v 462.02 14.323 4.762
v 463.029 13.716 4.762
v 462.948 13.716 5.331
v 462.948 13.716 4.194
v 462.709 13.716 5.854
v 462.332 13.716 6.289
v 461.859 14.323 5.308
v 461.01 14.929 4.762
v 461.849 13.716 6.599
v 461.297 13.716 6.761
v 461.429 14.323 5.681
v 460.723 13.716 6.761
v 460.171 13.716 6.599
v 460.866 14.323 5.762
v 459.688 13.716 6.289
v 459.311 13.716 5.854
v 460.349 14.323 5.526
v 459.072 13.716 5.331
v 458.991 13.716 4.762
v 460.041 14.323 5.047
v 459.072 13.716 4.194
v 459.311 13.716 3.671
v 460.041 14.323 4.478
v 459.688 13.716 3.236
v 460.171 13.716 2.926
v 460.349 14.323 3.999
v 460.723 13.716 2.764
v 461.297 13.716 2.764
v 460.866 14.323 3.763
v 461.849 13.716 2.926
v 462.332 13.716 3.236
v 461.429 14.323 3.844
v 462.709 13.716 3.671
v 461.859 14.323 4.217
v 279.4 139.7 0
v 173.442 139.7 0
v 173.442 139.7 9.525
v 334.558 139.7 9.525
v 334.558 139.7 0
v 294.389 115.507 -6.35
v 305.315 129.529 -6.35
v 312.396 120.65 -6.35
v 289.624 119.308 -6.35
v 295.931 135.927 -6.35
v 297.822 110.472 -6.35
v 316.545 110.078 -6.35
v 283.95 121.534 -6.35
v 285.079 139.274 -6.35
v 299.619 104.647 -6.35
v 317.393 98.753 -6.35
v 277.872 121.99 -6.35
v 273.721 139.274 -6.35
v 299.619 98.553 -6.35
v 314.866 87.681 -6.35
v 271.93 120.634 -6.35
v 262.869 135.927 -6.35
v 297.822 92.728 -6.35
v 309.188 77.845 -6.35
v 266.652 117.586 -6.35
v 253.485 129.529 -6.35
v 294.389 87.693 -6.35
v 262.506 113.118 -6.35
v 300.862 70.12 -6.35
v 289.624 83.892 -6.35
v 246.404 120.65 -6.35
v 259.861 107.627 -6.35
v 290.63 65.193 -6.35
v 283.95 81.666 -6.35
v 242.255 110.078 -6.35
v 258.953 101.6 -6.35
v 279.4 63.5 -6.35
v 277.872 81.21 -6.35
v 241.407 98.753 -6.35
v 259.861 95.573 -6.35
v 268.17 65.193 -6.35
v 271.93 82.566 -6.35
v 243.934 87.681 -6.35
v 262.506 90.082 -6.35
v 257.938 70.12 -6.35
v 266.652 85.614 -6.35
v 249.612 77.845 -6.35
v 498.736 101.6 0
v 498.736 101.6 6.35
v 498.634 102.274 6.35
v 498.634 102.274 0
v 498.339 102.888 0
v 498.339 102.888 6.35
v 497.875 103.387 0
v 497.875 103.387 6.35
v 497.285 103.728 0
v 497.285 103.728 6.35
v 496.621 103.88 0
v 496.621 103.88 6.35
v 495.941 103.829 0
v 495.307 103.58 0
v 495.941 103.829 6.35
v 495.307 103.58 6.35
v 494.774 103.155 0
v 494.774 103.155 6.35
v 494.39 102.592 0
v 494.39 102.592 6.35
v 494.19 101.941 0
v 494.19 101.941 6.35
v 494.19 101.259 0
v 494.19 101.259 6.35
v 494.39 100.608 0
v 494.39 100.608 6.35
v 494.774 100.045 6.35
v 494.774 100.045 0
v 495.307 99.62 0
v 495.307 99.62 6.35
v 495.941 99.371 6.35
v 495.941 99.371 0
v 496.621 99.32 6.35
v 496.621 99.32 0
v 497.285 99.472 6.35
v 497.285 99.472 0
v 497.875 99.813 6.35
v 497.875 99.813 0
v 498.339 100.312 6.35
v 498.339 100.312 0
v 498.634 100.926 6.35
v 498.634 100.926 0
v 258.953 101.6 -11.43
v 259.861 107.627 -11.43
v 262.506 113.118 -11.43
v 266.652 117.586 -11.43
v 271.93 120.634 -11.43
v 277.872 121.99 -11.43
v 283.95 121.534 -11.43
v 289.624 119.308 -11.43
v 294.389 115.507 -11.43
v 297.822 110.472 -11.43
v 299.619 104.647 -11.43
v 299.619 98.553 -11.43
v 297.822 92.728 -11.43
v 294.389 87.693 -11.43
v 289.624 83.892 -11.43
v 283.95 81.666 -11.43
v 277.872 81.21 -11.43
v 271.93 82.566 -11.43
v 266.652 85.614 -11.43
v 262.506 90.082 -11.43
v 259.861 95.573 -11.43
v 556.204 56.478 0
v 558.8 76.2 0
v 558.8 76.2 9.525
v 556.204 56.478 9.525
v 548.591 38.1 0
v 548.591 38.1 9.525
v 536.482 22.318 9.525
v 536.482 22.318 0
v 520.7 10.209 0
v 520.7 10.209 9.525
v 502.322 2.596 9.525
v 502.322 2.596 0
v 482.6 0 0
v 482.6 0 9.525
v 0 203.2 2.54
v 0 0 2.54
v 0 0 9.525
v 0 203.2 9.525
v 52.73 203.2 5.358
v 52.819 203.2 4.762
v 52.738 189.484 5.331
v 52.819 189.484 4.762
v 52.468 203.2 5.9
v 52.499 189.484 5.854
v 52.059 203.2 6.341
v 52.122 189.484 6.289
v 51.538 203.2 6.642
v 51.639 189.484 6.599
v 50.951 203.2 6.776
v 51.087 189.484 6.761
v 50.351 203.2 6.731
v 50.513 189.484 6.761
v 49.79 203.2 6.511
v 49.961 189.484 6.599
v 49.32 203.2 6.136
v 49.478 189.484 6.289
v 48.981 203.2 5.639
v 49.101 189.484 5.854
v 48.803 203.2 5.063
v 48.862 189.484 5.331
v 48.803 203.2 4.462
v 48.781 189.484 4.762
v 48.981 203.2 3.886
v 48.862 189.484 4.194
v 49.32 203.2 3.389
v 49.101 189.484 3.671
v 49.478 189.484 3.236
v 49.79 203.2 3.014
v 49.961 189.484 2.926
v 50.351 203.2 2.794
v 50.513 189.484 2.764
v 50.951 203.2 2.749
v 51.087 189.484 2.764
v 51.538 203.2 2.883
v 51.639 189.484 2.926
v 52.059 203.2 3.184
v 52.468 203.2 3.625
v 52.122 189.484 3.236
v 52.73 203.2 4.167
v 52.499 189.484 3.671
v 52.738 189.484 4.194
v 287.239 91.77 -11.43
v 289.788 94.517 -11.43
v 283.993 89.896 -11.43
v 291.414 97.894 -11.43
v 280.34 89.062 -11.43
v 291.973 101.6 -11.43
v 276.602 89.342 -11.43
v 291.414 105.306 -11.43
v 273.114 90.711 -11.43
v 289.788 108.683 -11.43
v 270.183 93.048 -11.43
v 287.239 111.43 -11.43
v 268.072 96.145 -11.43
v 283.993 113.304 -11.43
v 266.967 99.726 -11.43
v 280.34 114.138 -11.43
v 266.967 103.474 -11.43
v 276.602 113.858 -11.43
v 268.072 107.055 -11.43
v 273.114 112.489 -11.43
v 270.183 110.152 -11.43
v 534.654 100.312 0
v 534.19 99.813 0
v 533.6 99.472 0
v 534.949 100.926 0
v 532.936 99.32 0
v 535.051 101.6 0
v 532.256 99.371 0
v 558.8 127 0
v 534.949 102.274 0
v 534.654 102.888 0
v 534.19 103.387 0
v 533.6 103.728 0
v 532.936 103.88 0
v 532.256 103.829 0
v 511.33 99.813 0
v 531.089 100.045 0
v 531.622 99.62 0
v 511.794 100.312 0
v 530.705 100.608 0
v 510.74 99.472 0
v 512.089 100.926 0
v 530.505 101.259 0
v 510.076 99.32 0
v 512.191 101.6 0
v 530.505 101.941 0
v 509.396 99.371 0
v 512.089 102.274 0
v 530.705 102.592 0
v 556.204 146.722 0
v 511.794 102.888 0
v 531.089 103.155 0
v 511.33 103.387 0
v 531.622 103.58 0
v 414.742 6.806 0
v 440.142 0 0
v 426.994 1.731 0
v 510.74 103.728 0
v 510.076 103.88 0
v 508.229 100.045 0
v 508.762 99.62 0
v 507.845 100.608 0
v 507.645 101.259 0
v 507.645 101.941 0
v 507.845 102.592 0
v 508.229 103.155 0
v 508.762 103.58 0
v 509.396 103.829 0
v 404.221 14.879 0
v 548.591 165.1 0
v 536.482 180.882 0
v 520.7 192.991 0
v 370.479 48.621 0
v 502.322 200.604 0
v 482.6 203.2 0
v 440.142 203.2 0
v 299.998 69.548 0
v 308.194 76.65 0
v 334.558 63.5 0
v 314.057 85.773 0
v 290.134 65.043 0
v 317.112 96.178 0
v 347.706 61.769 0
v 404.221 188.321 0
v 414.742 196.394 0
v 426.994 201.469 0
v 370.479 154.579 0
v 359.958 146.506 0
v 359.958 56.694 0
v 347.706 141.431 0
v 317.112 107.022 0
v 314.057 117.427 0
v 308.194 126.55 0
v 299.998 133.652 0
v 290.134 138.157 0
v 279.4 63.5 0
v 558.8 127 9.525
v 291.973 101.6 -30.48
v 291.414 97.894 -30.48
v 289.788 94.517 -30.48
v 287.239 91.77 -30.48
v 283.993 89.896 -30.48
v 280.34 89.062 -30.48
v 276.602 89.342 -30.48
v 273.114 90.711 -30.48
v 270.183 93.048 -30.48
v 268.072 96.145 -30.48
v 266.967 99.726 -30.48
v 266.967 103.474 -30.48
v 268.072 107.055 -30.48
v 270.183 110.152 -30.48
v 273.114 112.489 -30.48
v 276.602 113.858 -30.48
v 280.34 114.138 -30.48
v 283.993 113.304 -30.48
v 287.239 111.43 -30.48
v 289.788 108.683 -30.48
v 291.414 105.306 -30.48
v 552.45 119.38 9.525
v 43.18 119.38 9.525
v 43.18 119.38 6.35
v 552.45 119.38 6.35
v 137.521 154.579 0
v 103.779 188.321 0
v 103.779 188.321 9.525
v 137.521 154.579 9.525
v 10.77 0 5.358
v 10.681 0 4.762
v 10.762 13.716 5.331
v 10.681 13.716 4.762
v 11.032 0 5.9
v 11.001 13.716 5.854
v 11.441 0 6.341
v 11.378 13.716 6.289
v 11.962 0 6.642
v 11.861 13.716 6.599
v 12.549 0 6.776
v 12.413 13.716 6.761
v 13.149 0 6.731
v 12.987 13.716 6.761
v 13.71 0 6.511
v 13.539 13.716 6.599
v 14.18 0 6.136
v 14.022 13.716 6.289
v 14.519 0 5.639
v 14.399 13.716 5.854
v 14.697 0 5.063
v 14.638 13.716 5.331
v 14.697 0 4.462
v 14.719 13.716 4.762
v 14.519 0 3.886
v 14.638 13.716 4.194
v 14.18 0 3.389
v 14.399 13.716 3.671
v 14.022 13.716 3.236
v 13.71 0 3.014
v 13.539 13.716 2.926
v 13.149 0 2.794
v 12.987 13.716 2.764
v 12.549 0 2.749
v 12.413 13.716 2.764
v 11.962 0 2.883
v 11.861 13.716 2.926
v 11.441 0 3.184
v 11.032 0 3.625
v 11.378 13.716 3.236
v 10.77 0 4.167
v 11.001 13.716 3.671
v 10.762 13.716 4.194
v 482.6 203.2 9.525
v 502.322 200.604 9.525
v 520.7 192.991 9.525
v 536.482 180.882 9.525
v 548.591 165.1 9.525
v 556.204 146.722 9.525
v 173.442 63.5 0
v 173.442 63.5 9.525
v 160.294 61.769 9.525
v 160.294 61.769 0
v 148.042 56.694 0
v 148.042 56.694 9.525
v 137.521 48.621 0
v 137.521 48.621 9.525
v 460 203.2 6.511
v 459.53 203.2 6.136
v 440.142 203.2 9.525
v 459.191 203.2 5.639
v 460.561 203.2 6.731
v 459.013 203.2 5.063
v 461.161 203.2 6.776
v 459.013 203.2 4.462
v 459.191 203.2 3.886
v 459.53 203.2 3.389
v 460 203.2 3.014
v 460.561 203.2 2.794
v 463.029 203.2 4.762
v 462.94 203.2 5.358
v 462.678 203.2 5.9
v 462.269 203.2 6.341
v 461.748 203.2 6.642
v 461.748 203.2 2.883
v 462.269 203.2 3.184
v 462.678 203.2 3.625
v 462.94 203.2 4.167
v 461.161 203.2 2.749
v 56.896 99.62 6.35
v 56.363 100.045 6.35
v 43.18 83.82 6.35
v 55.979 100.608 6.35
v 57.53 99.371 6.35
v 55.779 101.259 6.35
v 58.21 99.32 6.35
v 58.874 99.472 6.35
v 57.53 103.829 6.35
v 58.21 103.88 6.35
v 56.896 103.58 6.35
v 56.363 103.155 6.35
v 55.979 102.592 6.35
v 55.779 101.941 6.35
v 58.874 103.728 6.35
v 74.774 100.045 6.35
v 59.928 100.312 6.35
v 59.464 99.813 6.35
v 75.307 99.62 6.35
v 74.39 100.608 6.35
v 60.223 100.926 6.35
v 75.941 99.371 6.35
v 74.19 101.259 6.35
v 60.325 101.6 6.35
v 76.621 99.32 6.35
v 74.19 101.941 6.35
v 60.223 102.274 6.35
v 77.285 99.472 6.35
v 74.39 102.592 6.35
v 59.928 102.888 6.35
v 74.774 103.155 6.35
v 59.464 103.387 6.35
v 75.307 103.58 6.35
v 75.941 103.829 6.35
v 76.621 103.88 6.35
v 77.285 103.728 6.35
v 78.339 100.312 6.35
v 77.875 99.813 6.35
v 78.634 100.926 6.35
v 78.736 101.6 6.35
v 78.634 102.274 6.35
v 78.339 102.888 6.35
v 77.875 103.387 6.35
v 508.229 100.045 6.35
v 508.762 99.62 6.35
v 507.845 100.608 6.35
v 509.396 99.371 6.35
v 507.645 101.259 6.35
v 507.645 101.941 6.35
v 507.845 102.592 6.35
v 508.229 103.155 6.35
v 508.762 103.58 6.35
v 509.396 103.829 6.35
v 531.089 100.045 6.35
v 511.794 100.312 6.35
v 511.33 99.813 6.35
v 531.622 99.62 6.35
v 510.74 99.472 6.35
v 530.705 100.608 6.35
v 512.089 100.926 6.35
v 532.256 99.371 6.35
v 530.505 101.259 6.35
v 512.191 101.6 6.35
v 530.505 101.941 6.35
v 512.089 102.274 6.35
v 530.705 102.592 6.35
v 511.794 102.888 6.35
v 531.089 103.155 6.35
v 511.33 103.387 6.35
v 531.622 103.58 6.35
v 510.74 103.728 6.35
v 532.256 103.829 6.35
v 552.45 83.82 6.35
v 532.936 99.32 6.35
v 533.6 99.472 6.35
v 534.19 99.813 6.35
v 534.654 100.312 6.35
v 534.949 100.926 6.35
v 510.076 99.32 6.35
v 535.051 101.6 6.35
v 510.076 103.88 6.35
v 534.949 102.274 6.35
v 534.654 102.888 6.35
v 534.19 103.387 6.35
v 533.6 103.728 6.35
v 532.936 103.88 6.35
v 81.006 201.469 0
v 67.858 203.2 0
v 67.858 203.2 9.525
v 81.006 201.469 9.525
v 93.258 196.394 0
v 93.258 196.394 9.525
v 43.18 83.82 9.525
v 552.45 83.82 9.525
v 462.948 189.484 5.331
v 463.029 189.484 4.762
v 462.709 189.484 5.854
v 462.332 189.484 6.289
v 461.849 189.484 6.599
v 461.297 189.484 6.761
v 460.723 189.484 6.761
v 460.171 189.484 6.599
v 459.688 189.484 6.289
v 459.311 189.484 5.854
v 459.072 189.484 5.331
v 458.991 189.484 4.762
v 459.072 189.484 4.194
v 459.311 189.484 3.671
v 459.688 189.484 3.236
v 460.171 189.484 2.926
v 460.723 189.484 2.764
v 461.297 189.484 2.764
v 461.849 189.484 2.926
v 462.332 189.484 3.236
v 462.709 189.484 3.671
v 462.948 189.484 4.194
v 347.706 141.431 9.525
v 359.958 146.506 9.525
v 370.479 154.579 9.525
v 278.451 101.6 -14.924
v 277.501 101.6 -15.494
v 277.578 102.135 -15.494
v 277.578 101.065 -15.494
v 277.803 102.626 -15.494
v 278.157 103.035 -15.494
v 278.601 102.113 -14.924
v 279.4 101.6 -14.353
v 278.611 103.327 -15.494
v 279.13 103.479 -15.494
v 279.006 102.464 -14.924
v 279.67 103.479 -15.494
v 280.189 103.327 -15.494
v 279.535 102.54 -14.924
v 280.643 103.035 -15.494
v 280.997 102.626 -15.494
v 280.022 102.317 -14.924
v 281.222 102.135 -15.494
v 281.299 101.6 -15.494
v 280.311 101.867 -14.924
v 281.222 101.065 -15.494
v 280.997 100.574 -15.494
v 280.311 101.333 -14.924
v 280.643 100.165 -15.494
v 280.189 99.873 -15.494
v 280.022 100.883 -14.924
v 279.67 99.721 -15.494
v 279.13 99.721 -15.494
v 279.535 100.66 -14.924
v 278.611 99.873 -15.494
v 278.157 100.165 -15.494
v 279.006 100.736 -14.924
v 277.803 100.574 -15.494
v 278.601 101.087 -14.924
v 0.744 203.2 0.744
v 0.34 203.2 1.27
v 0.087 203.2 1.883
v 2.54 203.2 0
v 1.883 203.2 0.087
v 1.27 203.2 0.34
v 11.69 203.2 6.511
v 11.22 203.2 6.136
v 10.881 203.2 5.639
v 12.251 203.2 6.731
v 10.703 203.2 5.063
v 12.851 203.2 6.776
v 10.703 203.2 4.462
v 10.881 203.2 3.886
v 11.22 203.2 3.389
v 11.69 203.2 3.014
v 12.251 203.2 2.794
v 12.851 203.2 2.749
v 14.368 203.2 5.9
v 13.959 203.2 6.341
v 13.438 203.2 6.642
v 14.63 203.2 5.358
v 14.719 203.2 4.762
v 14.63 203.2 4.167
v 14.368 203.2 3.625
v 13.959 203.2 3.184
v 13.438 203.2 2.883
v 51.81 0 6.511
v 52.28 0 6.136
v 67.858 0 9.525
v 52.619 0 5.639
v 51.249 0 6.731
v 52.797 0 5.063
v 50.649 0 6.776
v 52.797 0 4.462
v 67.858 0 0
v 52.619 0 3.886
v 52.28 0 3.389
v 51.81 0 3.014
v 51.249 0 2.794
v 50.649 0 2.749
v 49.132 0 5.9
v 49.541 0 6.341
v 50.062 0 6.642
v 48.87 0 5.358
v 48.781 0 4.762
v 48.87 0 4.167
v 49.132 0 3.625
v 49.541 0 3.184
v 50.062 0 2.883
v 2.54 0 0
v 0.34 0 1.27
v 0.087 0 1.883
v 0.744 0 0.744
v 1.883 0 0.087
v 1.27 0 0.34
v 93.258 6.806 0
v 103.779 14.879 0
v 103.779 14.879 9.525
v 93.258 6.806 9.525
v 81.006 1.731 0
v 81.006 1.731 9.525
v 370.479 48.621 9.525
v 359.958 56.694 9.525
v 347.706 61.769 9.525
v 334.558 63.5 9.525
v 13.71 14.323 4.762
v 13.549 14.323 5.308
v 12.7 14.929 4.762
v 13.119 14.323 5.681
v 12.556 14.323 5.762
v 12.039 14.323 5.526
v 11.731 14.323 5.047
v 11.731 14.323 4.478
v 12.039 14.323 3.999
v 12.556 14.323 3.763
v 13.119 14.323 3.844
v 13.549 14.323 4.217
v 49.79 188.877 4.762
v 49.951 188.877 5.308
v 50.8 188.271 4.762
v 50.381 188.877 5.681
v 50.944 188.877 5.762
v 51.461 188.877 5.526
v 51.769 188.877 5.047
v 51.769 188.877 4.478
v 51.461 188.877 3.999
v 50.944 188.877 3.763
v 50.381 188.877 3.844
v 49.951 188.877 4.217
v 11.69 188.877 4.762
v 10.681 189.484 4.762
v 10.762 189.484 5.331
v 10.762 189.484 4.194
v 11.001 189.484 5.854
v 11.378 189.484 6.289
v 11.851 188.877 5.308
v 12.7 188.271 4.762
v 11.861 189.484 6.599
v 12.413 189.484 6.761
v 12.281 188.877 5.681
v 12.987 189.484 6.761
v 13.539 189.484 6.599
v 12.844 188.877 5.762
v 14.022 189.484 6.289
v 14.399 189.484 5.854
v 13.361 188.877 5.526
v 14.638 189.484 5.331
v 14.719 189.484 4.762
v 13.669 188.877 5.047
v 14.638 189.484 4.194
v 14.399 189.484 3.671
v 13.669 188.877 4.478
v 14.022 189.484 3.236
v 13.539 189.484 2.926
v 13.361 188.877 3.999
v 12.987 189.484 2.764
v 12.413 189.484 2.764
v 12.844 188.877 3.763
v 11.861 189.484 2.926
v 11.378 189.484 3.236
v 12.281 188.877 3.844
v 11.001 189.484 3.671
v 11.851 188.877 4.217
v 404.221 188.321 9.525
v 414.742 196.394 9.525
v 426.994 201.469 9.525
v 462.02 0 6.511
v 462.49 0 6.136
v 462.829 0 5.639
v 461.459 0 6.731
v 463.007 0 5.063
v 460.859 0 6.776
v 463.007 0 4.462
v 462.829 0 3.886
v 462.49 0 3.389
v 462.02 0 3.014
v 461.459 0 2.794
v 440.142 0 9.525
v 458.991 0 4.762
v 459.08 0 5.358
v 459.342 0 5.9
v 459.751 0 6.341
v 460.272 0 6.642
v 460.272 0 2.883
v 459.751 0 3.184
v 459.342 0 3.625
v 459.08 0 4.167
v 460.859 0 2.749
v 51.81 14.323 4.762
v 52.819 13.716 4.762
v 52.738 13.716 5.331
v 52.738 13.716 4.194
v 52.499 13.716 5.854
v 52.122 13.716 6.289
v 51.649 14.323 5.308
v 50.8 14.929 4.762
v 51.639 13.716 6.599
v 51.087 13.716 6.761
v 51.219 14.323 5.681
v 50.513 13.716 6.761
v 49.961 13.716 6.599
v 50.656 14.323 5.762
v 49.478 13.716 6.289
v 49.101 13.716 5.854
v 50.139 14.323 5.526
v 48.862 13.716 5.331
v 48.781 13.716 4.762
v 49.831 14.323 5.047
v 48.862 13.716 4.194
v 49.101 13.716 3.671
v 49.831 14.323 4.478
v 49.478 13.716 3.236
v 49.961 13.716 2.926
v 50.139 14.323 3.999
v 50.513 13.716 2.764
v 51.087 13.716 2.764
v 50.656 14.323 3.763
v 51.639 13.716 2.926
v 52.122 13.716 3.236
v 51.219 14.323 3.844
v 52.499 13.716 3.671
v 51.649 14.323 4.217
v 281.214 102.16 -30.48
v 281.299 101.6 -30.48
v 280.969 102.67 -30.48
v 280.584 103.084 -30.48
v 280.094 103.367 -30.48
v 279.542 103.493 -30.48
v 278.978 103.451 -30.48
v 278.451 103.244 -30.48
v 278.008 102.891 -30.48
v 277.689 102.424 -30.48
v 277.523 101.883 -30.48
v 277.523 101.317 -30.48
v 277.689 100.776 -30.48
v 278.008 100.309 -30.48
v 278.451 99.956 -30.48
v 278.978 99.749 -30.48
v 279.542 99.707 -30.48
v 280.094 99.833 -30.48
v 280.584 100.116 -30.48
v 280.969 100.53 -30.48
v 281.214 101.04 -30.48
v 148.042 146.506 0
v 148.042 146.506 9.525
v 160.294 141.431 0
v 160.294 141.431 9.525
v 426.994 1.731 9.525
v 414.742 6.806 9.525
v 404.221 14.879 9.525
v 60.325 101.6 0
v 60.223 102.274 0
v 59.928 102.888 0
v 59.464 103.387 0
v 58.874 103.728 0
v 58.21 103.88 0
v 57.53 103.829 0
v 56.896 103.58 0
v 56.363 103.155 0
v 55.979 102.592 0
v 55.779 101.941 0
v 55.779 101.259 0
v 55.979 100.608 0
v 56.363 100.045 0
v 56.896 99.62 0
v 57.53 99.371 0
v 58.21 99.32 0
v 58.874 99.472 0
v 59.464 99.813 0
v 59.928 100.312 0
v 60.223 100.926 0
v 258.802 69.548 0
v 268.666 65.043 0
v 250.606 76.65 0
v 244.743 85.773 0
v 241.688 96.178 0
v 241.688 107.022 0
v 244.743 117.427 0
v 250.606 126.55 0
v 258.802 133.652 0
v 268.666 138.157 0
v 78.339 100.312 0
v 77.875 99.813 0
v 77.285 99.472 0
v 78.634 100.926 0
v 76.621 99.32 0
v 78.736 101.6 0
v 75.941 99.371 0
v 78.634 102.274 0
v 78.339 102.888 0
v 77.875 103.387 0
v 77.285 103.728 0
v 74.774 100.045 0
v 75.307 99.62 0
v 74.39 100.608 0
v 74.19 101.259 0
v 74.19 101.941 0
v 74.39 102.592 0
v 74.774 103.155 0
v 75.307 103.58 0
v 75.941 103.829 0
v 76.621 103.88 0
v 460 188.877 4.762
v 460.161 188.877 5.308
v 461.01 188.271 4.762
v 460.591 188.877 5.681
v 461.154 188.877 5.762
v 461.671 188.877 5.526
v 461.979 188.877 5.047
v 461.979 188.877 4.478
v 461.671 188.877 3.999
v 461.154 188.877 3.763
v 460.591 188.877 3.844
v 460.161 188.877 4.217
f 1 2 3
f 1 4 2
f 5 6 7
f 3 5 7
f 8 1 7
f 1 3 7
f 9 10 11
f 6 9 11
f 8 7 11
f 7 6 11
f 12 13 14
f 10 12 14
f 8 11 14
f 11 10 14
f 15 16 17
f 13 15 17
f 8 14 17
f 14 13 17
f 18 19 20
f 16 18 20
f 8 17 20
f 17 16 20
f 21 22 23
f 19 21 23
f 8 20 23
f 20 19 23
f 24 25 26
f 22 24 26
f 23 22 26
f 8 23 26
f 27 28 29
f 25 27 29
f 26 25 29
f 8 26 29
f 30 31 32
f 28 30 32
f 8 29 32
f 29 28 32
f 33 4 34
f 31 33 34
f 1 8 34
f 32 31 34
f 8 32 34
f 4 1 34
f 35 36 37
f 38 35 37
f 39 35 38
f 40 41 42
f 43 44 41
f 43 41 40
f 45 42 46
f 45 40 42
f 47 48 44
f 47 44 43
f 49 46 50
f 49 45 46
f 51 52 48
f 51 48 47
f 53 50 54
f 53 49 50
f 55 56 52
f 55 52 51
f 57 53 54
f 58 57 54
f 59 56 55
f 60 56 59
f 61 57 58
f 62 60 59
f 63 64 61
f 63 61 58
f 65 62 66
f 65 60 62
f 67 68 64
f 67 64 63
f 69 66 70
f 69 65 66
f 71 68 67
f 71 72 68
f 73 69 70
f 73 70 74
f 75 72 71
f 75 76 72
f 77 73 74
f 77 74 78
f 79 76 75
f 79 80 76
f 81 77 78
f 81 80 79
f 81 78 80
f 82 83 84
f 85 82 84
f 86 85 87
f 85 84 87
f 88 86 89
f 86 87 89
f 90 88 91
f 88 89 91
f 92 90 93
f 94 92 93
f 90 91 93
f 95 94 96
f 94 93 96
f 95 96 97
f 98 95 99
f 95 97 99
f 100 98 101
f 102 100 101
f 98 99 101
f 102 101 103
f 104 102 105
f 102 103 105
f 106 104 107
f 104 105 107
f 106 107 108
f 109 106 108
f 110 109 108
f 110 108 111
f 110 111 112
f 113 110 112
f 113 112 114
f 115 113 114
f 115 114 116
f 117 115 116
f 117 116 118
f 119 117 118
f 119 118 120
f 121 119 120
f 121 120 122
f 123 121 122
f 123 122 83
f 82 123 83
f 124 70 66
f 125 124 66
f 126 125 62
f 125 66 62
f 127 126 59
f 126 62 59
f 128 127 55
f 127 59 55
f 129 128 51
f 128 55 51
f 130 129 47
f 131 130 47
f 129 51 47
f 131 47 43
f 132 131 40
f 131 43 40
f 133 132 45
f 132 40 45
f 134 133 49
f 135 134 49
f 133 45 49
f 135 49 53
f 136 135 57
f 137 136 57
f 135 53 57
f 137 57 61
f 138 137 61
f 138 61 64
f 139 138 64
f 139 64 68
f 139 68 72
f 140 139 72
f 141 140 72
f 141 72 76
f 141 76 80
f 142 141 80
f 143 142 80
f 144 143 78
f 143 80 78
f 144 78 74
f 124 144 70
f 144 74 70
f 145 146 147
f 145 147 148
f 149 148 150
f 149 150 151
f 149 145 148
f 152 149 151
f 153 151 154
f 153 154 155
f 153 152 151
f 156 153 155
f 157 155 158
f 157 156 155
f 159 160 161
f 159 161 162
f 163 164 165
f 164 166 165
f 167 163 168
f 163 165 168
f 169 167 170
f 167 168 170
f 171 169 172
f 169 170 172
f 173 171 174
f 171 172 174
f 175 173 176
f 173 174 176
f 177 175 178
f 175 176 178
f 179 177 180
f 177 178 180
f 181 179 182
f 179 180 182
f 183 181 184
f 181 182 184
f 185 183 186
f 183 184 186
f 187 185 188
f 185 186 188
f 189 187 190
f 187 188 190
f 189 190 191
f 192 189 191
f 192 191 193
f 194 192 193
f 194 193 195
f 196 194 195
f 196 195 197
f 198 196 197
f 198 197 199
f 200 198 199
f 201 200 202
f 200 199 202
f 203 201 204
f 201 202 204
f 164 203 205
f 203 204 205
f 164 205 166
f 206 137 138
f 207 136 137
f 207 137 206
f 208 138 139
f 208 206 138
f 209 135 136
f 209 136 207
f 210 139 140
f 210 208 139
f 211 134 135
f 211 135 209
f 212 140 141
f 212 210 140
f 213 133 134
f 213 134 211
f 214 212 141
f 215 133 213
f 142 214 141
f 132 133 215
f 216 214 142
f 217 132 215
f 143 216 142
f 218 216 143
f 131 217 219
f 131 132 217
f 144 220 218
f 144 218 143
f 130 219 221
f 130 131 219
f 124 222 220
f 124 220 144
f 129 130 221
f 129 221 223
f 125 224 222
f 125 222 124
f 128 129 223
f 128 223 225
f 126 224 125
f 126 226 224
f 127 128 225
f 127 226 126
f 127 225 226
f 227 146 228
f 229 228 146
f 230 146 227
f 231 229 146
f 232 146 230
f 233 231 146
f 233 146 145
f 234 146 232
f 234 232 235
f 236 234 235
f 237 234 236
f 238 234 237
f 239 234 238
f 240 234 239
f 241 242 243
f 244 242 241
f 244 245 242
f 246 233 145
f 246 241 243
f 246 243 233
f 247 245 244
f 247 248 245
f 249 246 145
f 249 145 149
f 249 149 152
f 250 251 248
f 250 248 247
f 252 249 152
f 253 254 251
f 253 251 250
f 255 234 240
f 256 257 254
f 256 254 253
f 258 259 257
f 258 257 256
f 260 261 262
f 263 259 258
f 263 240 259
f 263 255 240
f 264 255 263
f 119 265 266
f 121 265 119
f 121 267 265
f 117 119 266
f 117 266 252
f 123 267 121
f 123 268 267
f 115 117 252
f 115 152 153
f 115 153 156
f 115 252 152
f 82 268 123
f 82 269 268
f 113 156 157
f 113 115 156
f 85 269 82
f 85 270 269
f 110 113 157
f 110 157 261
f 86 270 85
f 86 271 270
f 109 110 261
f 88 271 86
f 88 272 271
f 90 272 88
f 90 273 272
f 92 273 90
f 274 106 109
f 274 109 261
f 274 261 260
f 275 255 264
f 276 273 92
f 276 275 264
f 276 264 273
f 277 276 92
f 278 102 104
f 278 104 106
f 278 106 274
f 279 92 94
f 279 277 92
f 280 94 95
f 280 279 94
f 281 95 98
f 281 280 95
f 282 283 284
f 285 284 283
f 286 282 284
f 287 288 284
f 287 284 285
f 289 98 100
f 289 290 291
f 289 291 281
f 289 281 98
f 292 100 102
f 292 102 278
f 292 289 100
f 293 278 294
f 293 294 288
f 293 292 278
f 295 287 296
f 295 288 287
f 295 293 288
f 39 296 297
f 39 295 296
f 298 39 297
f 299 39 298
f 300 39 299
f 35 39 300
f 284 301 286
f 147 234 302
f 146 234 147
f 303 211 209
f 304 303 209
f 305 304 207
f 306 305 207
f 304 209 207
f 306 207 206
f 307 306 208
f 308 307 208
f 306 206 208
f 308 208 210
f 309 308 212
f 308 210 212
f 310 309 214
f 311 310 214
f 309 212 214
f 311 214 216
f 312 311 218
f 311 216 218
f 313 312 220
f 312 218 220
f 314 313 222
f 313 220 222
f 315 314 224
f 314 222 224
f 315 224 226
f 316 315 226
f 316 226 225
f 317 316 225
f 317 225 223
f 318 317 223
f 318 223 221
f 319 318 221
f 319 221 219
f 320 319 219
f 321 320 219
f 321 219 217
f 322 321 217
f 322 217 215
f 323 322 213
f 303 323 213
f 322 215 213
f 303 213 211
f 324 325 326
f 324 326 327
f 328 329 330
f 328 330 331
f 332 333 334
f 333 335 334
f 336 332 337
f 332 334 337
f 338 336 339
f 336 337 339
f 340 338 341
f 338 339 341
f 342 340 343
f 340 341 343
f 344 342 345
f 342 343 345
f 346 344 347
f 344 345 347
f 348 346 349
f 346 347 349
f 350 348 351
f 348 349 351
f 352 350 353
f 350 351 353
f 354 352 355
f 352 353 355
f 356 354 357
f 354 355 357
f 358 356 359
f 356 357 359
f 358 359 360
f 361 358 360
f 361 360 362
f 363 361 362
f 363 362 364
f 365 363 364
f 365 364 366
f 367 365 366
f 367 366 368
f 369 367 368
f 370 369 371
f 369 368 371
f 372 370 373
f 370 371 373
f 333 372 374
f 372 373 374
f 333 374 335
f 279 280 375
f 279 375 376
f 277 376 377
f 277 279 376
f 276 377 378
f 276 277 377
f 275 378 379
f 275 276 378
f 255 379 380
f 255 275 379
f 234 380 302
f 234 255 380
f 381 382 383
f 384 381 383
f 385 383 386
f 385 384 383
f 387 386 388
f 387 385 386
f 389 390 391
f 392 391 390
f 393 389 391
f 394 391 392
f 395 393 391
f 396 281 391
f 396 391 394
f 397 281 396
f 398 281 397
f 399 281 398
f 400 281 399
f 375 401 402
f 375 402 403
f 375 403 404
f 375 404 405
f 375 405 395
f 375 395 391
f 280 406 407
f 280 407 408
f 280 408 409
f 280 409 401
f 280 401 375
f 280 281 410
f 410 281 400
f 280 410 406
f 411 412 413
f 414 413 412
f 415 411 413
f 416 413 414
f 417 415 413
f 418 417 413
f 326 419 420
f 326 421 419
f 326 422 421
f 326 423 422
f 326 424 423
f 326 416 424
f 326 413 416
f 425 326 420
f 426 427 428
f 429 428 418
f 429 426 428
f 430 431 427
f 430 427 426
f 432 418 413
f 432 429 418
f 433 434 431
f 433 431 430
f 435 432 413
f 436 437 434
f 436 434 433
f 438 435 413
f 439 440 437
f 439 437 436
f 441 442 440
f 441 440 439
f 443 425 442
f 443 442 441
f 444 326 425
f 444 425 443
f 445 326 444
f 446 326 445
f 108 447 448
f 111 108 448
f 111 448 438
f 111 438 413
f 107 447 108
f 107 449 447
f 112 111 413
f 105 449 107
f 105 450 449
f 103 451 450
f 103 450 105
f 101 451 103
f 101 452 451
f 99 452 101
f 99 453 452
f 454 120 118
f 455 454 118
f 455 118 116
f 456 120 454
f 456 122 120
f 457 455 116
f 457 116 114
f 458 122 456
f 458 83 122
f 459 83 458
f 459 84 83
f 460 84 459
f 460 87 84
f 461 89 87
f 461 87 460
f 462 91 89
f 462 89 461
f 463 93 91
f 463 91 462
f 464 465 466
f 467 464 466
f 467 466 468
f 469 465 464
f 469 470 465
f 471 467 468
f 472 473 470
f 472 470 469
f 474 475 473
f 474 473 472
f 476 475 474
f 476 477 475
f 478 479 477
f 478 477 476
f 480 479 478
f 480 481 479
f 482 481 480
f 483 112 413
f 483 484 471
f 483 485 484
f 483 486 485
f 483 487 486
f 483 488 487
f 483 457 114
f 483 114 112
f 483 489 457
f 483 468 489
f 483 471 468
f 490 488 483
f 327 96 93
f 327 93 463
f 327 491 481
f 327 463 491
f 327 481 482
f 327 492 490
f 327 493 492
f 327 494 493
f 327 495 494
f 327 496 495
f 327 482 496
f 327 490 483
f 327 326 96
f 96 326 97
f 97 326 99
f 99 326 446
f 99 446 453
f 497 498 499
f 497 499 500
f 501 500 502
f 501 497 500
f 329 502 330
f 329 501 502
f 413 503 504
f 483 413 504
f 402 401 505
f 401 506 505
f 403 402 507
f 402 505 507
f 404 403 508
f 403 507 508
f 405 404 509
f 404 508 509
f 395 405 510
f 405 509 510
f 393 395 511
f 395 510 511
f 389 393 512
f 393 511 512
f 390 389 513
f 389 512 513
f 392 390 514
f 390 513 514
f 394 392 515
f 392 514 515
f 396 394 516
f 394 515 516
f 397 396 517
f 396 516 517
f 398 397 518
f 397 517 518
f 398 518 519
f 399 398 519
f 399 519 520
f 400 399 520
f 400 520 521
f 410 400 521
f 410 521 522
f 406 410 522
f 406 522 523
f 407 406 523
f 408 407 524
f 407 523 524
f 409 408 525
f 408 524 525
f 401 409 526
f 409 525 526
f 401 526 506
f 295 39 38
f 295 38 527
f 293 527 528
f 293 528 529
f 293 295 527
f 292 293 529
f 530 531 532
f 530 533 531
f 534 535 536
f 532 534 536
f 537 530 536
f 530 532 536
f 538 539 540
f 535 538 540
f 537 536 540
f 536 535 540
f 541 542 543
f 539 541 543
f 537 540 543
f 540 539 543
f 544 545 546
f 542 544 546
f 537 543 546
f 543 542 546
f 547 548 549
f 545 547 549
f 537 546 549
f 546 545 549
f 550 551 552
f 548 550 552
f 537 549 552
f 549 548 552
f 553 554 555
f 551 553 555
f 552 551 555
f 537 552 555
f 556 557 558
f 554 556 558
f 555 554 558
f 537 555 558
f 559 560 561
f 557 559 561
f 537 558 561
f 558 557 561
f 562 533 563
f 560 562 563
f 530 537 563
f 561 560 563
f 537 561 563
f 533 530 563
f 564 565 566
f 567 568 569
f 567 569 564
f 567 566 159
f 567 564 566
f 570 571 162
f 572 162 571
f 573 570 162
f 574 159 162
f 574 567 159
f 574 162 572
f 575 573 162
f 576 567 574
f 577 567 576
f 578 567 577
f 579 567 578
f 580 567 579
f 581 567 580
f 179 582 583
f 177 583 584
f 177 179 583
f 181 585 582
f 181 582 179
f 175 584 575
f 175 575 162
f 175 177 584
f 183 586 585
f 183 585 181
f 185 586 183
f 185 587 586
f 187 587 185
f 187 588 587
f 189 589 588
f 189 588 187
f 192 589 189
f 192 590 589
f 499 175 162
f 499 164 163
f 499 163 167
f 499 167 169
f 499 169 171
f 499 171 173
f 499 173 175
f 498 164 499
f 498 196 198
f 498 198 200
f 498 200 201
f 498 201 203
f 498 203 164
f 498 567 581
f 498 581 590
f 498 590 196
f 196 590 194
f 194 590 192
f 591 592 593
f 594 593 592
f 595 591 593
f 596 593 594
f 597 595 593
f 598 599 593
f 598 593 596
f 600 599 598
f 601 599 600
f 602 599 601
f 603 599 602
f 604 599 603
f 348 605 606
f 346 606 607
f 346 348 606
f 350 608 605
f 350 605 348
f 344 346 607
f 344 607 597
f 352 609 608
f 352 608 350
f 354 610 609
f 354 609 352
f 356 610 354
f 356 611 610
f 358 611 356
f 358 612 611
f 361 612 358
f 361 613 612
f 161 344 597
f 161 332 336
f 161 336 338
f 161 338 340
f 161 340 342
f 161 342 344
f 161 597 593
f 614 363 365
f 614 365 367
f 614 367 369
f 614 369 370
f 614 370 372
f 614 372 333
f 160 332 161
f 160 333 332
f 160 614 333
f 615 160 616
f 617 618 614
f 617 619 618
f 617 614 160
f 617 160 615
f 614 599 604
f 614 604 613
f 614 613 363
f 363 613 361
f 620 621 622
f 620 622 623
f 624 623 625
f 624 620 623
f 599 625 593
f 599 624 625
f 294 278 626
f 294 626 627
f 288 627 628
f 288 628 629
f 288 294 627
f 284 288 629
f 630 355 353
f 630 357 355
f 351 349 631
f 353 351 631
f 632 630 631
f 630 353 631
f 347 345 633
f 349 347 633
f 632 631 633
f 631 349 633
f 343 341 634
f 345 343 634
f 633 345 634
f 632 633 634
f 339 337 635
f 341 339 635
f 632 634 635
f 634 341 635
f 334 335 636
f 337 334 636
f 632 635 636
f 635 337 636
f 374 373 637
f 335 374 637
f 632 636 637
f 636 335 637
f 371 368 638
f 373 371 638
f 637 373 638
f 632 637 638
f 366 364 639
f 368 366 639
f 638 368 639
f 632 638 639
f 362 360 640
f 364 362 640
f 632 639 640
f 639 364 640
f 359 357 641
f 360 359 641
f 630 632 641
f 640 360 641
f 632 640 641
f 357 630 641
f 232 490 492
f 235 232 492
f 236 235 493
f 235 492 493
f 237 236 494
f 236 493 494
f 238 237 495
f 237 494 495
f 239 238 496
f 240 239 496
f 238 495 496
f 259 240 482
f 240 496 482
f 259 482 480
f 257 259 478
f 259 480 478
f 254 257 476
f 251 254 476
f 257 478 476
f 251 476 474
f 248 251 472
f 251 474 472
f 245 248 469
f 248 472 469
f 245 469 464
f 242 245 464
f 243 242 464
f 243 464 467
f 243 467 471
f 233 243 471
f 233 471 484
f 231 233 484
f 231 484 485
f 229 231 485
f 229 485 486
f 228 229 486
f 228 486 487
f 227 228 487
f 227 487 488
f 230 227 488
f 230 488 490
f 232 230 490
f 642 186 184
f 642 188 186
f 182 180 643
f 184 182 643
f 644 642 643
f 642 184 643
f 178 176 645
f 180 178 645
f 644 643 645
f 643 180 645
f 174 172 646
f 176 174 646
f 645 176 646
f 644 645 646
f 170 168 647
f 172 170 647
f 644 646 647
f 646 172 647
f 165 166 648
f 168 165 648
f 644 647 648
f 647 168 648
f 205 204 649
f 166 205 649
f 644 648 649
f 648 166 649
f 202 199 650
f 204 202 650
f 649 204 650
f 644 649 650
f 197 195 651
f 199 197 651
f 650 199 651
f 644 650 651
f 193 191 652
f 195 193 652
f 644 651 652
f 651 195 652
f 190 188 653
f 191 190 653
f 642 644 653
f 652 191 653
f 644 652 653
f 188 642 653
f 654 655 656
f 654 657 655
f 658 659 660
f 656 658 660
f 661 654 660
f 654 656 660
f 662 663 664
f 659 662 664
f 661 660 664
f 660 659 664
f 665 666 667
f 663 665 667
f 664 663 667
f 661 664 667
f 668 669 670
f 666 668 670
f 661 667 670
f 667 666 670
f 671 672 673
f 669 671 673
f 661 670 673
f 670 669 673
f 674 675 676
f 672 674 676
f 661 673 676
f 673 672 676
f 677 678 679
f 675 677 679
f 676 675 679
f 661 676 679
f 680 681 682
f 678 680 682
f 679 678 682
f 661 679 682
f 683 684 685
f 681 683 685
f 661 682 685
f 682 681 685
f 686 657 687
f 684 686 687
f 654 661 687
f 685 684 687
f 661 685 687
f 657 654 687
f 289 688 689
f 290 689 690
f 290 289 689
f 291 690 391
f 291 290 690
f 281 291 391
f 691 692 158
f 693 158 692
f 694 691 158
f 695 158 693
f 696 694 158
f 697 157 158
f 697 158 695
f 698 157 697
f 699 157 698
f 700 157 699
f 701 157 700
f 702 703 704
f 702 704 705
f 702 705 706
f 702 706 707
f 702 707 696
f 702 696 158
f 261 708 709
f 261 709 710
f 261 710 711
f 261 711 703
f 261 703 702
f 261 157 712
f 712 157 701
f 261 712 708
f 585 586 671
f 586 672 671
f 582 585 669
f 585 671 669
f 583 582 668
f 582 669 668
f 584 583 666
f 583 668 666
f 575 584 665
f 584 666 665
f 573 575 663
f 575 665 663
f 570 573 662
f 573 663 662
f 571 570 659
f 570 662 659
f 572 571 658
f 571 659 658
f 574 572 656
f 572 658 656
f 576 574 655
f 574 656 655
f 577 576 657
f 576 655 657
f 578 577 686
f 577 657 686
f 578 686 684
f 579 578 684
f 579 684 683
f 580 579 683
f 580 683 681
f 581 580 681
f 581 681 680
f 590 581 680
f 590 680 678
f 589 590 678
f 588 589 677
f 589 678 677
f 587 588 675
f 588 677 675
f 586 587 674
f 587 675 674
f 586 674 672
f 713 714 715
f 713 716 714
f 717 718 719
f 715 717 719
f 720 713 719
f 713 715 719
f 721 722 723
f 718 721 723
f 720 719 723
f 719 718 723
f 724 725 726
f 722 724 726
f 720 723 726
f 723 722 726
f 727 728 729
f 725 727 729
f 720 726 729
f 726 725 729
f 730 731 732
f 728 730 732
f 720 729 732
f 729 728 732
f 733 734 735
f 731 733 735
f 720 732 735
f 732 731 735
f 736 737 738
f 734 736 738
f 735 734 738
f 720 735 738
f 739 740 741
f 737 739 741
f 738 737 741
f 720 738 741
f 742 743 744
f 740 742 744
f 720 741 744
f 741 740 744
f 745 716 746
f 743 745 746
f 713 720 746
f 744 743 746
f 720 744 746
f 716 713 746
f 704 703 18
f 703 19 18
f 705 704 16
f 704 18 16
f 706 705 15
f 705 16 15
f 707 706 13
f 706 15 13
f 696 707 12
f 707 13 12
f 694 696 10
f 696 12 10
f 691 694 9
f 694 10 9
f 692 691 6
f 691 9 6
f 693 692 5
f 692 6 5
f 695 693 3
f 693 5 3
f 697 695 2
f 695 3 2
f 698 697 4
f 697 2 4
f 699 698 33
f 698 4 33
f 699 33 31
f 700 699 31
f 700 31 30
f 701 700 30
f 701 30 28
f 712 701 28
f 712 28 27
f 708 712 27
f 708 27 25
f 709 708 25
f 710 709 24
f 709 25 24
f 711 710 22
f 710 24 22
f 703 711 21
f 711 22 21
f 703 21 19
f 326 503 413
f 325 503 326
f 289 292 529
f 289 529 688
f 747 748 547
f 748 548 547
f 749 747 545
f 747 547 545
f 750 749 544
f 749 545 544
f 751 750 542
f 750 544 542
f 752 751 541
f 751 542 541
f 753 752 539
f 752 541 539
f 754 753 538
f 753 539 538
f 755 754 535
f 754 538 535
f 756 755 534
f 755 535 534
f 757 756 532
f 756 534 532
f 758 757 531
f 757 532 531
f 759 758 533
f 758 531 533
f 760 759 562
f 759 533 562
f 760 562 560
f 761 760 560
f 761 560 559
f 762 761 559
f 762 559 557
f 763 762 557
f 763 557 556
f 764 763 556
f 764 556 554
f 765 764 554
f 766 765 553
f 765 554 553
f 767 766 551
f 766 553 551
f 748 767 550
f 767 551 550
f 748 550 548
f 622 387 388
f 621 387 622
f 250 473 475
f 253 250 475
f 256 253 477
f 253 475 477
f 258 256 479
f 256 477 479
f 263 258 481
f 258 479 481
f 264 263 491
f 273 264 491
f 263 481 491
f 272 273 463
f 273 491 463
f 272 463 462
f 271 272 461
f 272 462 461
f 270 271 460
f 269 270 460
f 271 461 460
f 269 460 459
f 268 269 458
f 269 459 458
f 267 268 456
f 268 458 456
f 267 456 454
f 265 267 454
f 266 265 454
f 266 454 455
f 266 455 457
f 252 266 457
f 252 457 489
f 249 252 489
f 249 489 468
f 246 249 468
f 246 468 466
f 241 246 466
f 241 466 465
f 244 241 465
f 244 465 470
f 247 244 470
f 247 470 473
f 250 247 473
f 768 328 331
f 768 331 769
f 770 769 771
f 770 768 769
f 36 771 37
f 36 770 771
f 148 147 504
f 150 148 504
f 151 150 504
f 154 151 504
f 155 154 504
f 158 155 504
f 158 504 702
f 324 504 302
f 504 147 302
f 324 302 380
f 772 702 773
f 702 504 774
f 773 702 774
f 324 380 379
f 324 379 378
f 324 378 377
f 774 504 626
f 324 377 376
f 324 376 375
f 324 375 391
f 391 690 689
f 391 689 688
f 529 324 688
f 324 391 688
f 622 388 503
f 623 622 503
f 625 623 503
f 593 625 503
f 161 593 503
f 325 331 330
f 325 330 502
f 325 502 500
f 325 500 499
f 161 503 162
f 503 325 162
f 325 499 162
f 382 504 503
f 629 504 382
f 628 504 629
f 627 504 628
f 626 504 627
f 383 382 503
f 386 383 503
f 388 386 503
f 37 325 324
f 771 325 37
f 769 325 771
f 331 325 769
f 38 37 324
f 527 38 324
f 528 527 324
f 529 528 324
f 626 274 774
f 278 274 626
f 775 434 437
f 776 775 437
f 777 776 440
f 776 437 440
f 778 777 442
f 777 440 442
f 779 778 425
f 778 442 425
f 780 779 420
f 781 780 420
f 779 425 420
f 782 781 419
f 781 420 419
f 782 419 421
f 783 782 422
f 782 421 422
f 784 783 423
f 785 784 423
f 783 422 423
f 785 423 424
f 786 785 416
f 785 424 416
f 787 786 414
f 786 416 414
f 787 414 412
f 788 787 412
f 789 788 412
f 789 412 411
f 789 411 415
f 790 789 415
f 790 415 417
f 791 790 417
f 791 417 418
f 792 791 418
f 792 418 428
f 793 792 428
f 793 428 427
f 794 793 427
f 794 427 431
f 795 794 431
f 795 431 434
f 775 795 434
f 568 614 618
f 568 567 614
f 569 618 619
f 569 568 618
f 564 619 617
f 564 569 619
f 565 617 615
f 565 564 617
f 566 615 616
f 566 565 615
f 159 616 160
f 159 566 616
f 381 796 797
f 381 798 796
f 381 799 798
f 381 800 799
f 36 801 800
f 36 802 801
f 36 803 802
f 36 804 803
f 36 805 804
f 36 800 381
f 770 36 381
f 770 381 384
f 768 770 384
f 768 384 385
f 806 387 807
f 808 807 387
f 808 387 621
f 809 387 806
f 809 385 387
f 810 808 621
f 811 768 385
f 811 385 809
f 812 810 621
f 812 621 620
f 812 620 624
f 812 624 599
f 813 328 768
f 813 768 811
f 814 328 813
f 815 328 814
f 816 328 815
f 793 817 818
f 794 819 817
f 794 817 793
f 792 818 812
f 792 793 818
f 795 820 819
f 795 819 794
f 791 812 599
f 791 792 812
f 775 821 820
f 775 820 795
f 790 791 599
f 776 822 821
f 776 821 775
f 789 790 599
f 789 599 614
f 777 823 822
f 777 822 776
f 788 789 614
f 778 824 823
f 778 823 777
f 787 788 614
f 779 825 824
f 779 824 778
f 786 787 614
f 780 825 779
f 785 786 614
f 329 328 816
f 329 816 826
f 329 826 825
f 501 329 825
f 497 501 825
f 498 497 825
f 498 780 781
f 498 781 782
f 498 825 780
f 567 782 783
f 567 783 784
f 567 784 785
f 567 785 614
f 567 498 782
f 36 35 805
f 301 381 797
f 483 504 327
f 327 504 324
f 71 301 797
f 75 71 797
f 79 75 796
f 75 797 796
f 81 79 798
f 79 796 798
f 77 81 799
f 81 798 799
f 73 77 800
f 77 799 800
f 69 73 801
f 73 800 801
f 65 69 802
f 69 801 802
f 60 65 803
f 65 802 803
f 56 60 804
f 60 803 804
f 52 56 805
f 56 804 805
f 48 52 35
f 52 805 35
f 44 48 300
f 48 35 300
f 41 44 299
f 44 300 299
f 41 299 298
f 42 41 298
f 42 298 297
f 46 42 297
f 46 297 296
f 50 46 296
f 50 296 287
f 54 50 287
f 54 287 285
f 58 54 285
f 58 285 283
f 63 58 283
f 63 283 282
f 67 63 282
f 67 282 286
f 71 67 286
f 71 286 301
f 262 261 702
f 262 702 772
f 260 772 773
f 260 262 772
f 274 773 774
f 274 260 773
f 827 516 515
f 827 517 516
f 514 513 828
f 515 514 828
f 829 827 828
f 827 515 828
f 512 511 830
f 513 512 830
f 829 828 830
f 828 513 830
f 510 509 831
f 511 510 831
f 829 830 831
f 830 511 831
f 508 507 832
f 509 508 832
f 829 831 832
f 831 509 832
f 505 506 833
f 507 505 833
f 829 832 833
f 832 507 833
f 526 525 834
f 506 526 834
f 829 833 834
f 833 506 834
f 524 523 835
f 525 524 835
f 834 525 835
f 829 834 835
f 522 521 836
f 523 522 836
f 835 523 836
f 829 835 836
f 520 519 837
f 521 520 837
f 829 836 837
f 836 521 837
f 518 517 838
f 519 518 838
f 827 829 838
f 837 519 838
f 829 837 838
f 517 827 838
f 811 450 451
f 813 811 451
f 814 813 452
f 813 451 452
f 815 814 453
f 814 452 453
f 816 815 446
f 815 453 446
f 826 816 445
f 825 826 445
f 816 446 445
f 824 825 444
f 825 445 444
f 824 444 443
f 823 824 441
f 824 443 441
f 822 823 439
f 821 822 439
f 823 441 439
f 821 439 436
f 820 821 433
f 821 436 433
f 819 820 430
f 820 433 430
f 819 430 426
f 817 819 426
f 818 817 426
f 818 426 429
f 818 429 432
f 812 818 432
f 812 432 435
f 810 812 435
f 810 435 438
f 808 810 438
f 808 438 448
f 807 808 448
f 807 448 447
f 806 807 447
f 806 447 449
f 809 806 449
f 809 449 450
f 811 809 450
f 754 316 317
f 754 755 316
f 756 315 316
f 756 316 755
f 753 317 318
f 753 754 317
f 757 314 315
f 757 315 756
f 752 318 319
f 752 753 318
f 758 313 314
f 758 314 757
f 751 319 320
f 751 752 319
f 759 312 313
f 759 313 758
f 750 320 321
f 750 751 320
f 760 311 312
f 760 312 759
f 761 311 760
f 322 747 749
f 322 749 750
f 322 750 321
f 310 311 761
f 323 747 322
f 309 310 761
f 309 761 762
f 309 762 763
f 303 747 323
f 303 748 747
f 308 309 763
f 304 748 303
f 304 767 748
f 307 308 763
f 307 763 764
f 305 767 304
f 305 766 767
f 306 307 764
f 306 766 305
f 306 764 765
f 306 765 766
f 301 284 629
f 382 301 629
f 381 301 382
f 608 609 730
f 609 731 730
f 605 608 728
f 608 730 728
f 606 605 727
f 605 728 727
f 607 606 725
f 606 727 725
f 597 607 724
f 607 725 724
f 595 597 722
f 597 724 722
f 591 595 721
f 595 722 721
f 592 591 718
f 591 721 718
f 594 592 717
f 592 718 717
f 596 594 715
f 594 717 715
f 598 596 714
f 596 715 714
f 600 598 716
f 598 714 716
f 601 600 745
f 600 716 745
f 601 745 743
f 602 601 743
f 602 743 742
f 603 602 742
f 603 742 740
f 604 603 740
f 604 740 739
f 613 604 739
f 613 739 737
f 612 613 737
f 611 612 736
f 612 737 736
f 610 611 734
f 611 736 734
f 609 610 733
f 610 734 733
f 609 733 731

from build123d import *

# Parameters (mm, degrees)
BOSS_EXTRUDE1_DEPTH        = 9.525
SKETCH2_W                  = 509.27
SKETCH2_H                  = 35.56
CUT_EXTRUDE1_DEPTH         = 3.175
SKETCH3_R                  = 2.286
CUT_EXTRUDE2_DEPTH         = 595.632661817
F_10_32_TAPPED_HOLE1_D     = 4.0386
F_10_32_TAPPED_HOLE1_DEPTH = 13.716
F_10_32_TAPPED_HOLE1_TIP   = 1.213317848
F_10_32_TAPPED_HOLE2_D     = 4.0386
F_10_32_TAPPED_HOLE2_DEPTH = 13.716
F_10_32_TAPPED_HOLE2_TIP   = 1.213317848
SKETCH8_R                  = 38.1
BOSS_EXTRUDE2_DEPTH        = 6.35
SKETCH9_R                  = 20.447
BOSS_EXTRUDE3_DEPTH        = 5.08
SKETCH10_R                 = 12.573
BOSS_EXTRUDE4_DEPTH        = 19.05
F_10_24_TAPPED_HOLE1_D     = 3.7973
F_10_24_TAPPED_HOLE1_DEPTH = 14.986
F_10_24_TAPPED_HOLE1_TIP   = 1.140824014
FILLET2_R                  = 2.54


with BuildPart() as part:
    # Sketch1 → Boss-Extrude1 (new body)
    with BuildSketch(Plane.XY):
        with BuildLine():
            Line((103.778975516, 188.321024484), (137.521024484, 154.578975516))
            ThreePointArc((137.521024484, 154.578975516), (154.001730604, 143.566919748), (173.442048969, 139.7))
            Line((173.442048969, 139.7), (334.557951031, 139.7))
            ThreePointArc((334.557951031, 139.7), (353.998269396, 143.566919748), (370.478975516, 154.578975516))
            Line((370.478975516, 154.578975516), (404.221024484, 188.321024484))
            ThreePointArc((404.221024484, 188.321024484), (420.701730604, 199.333080252), (440.142048969, 203.2))
            Line((440.142048969, 203.2), (482.6, 203.2))
            ThreePointArc((482.6, 203.2), (536.481536726, 180.881536726), (558.8, 127))
            Line((558.8, 127), (558.8, 76.2))
            ThreePointArc((558.8, 76.2), (536.481536726, 22.318463274), (482.6, 0))
            Line((482.6, 0), (440.142048969, 0))
            ThreePointArc((440.142048969, 0), (420.701730604, 3.866919748), (404.221024484, 14.878975516))
            Line((404.221024484, 14.878975516), (370.478975516, 48.621024484))
            ThreePointArc((370.478975516, 48.621024484), (353.998269396, 59.633080252), (334.557951031, 63.5))
            Line((334.557951031, 63.5), (173.442048969, 63.5))
            ThreePointArc((173.442048969, 63.5), (154.001730604, 59.633080252), (137.521024484, 48.621024484))
            Line((137.521024484, 48.621024484), (103.778975516, 14.878975516))
            ThreePointArc((103.778975516, 14.878975516), (87.298269396, 3.866919748), (67.857951031, 0))
            Line((67.857951031, 0), (0, 0))
            Line((0, 0), (0, 203.2))
            Line((0, 203.2), (67.857951031, 203.2))
            ThreePointArc((67.857951031, 203.2), (87.298269396, 199.333080252), (103.778975516, 188.321024484))
        make_face()
    extrude(amount=BOSS_EXTRUDE1_DEPTH)

    # Sketch2 → Cut-Extrude1 (cut)
    with BuildSketch(Plane.XY.offset(9.525)):
        with Locations((297.815, 101.6)):
            Rectangle(SKETCH2_W, SKETCH2_H)
    extrude(amount=-CUT_EXTRUDE1_DEPTH, mode=Mode.SUBTRACT)

    # Sketch3 → Cut-Extrude2 (cut, through all)
    with BuildSketch(Plane.XY.offset(6.35)):
        with Locations((532.765, 101.6)):
            Circle(SKETCH3_R)
        with Locations((58.039, 101.6)):
            Circle(SKETCH3_R)
        with Locations((509.905, 101.6)):
            Circle(SKETCH3_R)
        with Locations((496.45, 101.6)):
            Circle(SKETCH3_R)
        with Locations((76.44999999, 101.6)):
            Circle(SKETCH3_R)
    extrude(amount=-CUT_EXTRUDE2_DEPTH, mode=Mode.SUBTRACT)

    # #10-32 Tapped Hole1
    with Locations(Plane(origin=(0, 203.2, 0), x_dir=(-1, 0, 0), z_dir=(0, 1, 0))):
        with Locations((-12.7, 4.7625), (-50.8, 4.7625), (-461.01, 4.7625)):
            Hole(F_10_32_TAPPED_HOLE1_D / 2, depth=F_10_32_TAPPED_HOLE1_DEPTH)
            with Locations((0, 0, -(F_10_32_TAPPED_HOLE1_DEPTH + F_10_32_TAPPED_HOLE1_TIP / 2))):  # 118° drill point
                Cone(0, F_10_32_TAPPED_HOLE1_D / 2, F_10_32_TAPPED_HOLE1_TIP, mode=Mode.SUBTRACT)

    # #10-32 Tapped Hole2
    with Locations(Plane.XZ):
        with Locations((12.7, 4.7625), (50.8, 4.7625), (461.01, 4.7625)):
            Hole(F_10_32_TAPPED_HOLE2_D / 2, depth=F_10_32_TAPPED_HOLE2_DEPTH)
            with Locations((0, 0, -(F_10_32_TAPPED_HOLE2_DEPTH + F_10_32_TAPPED_HOLE2_TIP / 2))):  # 118° drill point
                Cone(0, F_10_32_TAPPED_HOLE2_D / 2, F_10_32_TAPPED_HOLE2_TIP, mode=Mode.SUBTRACT)

    # Sketch8 → Boss-Extrude2 (add)
    with BuildSketch(Plane(origin=(0, 0, 0), x_dir=(-1, 0, 0), z_dir=(0, 0, -1))):
        with Locations(Location((-279.4, 101.6, 0), (0, 0, 270))):
            Circle(SKETCH8_R)
    extrude(amount=BOSS_EXTRUDE2_DEPTH)

    # Sketch9 → Boss-Extrude3 (add)
    with BuildSketch(Plane(origin=(0, 0, -6.35), x_dir=(-1, 0, 0), z_dir=(0, 0, -1))):
        with Locations((-279.4, 101.6)):
            Circle(SKETCH9_R)
    extrude(amount=BOSS_EXTRUDE3_DEPTH)

    # Sketch10 → Boss-Extrude4 (add)
    with BuildSketch(Plane(origin=(0, 0, -11.43), x_dir=(-1, 0, 0), z_dir=(0, 0, -1))):
        with Locations(Location((-279.4, 101.6, 0), (0, 0, 180))):
            Circle(SKETCH10_R)
    extrude(amount=BOSS_EXTRUDE4_DEPTH)

    # #10-24 Tapped Hole1
    with Locations(Plane(origin=(0, 0, -30.48), x_dir=(-1, 0, 0), z_dir=(0, 0, -1))):
        with Locations((-279.4, 101.6)):
            Hole(F_10_24_TAPPED_HOLE1_D / 2, depth=F_10_24_TAPPED_HOLE1_DEPTH)
            with Locations((0, 0, -(F_10_24_TAPPED_HOLE1_DEPTH + F_10_24_TAPPED_HOLE1_TIP / 2))):  # 118° drill point
                Cone(0, F_10_24_TAPPED_HOLE1_D / 2, F_10_24_TAPPED_HOLE1_TIP, mode=Mode.SUBTRACT)

    # Fillet2
    fillet2_edges = [part.edges().sort_by_distance(p)[0] for p in [
        (0, 101.6, 0),
    ]]
    fillet(fillet2_edges, radius=FILLET2_R)


solid = part.part
